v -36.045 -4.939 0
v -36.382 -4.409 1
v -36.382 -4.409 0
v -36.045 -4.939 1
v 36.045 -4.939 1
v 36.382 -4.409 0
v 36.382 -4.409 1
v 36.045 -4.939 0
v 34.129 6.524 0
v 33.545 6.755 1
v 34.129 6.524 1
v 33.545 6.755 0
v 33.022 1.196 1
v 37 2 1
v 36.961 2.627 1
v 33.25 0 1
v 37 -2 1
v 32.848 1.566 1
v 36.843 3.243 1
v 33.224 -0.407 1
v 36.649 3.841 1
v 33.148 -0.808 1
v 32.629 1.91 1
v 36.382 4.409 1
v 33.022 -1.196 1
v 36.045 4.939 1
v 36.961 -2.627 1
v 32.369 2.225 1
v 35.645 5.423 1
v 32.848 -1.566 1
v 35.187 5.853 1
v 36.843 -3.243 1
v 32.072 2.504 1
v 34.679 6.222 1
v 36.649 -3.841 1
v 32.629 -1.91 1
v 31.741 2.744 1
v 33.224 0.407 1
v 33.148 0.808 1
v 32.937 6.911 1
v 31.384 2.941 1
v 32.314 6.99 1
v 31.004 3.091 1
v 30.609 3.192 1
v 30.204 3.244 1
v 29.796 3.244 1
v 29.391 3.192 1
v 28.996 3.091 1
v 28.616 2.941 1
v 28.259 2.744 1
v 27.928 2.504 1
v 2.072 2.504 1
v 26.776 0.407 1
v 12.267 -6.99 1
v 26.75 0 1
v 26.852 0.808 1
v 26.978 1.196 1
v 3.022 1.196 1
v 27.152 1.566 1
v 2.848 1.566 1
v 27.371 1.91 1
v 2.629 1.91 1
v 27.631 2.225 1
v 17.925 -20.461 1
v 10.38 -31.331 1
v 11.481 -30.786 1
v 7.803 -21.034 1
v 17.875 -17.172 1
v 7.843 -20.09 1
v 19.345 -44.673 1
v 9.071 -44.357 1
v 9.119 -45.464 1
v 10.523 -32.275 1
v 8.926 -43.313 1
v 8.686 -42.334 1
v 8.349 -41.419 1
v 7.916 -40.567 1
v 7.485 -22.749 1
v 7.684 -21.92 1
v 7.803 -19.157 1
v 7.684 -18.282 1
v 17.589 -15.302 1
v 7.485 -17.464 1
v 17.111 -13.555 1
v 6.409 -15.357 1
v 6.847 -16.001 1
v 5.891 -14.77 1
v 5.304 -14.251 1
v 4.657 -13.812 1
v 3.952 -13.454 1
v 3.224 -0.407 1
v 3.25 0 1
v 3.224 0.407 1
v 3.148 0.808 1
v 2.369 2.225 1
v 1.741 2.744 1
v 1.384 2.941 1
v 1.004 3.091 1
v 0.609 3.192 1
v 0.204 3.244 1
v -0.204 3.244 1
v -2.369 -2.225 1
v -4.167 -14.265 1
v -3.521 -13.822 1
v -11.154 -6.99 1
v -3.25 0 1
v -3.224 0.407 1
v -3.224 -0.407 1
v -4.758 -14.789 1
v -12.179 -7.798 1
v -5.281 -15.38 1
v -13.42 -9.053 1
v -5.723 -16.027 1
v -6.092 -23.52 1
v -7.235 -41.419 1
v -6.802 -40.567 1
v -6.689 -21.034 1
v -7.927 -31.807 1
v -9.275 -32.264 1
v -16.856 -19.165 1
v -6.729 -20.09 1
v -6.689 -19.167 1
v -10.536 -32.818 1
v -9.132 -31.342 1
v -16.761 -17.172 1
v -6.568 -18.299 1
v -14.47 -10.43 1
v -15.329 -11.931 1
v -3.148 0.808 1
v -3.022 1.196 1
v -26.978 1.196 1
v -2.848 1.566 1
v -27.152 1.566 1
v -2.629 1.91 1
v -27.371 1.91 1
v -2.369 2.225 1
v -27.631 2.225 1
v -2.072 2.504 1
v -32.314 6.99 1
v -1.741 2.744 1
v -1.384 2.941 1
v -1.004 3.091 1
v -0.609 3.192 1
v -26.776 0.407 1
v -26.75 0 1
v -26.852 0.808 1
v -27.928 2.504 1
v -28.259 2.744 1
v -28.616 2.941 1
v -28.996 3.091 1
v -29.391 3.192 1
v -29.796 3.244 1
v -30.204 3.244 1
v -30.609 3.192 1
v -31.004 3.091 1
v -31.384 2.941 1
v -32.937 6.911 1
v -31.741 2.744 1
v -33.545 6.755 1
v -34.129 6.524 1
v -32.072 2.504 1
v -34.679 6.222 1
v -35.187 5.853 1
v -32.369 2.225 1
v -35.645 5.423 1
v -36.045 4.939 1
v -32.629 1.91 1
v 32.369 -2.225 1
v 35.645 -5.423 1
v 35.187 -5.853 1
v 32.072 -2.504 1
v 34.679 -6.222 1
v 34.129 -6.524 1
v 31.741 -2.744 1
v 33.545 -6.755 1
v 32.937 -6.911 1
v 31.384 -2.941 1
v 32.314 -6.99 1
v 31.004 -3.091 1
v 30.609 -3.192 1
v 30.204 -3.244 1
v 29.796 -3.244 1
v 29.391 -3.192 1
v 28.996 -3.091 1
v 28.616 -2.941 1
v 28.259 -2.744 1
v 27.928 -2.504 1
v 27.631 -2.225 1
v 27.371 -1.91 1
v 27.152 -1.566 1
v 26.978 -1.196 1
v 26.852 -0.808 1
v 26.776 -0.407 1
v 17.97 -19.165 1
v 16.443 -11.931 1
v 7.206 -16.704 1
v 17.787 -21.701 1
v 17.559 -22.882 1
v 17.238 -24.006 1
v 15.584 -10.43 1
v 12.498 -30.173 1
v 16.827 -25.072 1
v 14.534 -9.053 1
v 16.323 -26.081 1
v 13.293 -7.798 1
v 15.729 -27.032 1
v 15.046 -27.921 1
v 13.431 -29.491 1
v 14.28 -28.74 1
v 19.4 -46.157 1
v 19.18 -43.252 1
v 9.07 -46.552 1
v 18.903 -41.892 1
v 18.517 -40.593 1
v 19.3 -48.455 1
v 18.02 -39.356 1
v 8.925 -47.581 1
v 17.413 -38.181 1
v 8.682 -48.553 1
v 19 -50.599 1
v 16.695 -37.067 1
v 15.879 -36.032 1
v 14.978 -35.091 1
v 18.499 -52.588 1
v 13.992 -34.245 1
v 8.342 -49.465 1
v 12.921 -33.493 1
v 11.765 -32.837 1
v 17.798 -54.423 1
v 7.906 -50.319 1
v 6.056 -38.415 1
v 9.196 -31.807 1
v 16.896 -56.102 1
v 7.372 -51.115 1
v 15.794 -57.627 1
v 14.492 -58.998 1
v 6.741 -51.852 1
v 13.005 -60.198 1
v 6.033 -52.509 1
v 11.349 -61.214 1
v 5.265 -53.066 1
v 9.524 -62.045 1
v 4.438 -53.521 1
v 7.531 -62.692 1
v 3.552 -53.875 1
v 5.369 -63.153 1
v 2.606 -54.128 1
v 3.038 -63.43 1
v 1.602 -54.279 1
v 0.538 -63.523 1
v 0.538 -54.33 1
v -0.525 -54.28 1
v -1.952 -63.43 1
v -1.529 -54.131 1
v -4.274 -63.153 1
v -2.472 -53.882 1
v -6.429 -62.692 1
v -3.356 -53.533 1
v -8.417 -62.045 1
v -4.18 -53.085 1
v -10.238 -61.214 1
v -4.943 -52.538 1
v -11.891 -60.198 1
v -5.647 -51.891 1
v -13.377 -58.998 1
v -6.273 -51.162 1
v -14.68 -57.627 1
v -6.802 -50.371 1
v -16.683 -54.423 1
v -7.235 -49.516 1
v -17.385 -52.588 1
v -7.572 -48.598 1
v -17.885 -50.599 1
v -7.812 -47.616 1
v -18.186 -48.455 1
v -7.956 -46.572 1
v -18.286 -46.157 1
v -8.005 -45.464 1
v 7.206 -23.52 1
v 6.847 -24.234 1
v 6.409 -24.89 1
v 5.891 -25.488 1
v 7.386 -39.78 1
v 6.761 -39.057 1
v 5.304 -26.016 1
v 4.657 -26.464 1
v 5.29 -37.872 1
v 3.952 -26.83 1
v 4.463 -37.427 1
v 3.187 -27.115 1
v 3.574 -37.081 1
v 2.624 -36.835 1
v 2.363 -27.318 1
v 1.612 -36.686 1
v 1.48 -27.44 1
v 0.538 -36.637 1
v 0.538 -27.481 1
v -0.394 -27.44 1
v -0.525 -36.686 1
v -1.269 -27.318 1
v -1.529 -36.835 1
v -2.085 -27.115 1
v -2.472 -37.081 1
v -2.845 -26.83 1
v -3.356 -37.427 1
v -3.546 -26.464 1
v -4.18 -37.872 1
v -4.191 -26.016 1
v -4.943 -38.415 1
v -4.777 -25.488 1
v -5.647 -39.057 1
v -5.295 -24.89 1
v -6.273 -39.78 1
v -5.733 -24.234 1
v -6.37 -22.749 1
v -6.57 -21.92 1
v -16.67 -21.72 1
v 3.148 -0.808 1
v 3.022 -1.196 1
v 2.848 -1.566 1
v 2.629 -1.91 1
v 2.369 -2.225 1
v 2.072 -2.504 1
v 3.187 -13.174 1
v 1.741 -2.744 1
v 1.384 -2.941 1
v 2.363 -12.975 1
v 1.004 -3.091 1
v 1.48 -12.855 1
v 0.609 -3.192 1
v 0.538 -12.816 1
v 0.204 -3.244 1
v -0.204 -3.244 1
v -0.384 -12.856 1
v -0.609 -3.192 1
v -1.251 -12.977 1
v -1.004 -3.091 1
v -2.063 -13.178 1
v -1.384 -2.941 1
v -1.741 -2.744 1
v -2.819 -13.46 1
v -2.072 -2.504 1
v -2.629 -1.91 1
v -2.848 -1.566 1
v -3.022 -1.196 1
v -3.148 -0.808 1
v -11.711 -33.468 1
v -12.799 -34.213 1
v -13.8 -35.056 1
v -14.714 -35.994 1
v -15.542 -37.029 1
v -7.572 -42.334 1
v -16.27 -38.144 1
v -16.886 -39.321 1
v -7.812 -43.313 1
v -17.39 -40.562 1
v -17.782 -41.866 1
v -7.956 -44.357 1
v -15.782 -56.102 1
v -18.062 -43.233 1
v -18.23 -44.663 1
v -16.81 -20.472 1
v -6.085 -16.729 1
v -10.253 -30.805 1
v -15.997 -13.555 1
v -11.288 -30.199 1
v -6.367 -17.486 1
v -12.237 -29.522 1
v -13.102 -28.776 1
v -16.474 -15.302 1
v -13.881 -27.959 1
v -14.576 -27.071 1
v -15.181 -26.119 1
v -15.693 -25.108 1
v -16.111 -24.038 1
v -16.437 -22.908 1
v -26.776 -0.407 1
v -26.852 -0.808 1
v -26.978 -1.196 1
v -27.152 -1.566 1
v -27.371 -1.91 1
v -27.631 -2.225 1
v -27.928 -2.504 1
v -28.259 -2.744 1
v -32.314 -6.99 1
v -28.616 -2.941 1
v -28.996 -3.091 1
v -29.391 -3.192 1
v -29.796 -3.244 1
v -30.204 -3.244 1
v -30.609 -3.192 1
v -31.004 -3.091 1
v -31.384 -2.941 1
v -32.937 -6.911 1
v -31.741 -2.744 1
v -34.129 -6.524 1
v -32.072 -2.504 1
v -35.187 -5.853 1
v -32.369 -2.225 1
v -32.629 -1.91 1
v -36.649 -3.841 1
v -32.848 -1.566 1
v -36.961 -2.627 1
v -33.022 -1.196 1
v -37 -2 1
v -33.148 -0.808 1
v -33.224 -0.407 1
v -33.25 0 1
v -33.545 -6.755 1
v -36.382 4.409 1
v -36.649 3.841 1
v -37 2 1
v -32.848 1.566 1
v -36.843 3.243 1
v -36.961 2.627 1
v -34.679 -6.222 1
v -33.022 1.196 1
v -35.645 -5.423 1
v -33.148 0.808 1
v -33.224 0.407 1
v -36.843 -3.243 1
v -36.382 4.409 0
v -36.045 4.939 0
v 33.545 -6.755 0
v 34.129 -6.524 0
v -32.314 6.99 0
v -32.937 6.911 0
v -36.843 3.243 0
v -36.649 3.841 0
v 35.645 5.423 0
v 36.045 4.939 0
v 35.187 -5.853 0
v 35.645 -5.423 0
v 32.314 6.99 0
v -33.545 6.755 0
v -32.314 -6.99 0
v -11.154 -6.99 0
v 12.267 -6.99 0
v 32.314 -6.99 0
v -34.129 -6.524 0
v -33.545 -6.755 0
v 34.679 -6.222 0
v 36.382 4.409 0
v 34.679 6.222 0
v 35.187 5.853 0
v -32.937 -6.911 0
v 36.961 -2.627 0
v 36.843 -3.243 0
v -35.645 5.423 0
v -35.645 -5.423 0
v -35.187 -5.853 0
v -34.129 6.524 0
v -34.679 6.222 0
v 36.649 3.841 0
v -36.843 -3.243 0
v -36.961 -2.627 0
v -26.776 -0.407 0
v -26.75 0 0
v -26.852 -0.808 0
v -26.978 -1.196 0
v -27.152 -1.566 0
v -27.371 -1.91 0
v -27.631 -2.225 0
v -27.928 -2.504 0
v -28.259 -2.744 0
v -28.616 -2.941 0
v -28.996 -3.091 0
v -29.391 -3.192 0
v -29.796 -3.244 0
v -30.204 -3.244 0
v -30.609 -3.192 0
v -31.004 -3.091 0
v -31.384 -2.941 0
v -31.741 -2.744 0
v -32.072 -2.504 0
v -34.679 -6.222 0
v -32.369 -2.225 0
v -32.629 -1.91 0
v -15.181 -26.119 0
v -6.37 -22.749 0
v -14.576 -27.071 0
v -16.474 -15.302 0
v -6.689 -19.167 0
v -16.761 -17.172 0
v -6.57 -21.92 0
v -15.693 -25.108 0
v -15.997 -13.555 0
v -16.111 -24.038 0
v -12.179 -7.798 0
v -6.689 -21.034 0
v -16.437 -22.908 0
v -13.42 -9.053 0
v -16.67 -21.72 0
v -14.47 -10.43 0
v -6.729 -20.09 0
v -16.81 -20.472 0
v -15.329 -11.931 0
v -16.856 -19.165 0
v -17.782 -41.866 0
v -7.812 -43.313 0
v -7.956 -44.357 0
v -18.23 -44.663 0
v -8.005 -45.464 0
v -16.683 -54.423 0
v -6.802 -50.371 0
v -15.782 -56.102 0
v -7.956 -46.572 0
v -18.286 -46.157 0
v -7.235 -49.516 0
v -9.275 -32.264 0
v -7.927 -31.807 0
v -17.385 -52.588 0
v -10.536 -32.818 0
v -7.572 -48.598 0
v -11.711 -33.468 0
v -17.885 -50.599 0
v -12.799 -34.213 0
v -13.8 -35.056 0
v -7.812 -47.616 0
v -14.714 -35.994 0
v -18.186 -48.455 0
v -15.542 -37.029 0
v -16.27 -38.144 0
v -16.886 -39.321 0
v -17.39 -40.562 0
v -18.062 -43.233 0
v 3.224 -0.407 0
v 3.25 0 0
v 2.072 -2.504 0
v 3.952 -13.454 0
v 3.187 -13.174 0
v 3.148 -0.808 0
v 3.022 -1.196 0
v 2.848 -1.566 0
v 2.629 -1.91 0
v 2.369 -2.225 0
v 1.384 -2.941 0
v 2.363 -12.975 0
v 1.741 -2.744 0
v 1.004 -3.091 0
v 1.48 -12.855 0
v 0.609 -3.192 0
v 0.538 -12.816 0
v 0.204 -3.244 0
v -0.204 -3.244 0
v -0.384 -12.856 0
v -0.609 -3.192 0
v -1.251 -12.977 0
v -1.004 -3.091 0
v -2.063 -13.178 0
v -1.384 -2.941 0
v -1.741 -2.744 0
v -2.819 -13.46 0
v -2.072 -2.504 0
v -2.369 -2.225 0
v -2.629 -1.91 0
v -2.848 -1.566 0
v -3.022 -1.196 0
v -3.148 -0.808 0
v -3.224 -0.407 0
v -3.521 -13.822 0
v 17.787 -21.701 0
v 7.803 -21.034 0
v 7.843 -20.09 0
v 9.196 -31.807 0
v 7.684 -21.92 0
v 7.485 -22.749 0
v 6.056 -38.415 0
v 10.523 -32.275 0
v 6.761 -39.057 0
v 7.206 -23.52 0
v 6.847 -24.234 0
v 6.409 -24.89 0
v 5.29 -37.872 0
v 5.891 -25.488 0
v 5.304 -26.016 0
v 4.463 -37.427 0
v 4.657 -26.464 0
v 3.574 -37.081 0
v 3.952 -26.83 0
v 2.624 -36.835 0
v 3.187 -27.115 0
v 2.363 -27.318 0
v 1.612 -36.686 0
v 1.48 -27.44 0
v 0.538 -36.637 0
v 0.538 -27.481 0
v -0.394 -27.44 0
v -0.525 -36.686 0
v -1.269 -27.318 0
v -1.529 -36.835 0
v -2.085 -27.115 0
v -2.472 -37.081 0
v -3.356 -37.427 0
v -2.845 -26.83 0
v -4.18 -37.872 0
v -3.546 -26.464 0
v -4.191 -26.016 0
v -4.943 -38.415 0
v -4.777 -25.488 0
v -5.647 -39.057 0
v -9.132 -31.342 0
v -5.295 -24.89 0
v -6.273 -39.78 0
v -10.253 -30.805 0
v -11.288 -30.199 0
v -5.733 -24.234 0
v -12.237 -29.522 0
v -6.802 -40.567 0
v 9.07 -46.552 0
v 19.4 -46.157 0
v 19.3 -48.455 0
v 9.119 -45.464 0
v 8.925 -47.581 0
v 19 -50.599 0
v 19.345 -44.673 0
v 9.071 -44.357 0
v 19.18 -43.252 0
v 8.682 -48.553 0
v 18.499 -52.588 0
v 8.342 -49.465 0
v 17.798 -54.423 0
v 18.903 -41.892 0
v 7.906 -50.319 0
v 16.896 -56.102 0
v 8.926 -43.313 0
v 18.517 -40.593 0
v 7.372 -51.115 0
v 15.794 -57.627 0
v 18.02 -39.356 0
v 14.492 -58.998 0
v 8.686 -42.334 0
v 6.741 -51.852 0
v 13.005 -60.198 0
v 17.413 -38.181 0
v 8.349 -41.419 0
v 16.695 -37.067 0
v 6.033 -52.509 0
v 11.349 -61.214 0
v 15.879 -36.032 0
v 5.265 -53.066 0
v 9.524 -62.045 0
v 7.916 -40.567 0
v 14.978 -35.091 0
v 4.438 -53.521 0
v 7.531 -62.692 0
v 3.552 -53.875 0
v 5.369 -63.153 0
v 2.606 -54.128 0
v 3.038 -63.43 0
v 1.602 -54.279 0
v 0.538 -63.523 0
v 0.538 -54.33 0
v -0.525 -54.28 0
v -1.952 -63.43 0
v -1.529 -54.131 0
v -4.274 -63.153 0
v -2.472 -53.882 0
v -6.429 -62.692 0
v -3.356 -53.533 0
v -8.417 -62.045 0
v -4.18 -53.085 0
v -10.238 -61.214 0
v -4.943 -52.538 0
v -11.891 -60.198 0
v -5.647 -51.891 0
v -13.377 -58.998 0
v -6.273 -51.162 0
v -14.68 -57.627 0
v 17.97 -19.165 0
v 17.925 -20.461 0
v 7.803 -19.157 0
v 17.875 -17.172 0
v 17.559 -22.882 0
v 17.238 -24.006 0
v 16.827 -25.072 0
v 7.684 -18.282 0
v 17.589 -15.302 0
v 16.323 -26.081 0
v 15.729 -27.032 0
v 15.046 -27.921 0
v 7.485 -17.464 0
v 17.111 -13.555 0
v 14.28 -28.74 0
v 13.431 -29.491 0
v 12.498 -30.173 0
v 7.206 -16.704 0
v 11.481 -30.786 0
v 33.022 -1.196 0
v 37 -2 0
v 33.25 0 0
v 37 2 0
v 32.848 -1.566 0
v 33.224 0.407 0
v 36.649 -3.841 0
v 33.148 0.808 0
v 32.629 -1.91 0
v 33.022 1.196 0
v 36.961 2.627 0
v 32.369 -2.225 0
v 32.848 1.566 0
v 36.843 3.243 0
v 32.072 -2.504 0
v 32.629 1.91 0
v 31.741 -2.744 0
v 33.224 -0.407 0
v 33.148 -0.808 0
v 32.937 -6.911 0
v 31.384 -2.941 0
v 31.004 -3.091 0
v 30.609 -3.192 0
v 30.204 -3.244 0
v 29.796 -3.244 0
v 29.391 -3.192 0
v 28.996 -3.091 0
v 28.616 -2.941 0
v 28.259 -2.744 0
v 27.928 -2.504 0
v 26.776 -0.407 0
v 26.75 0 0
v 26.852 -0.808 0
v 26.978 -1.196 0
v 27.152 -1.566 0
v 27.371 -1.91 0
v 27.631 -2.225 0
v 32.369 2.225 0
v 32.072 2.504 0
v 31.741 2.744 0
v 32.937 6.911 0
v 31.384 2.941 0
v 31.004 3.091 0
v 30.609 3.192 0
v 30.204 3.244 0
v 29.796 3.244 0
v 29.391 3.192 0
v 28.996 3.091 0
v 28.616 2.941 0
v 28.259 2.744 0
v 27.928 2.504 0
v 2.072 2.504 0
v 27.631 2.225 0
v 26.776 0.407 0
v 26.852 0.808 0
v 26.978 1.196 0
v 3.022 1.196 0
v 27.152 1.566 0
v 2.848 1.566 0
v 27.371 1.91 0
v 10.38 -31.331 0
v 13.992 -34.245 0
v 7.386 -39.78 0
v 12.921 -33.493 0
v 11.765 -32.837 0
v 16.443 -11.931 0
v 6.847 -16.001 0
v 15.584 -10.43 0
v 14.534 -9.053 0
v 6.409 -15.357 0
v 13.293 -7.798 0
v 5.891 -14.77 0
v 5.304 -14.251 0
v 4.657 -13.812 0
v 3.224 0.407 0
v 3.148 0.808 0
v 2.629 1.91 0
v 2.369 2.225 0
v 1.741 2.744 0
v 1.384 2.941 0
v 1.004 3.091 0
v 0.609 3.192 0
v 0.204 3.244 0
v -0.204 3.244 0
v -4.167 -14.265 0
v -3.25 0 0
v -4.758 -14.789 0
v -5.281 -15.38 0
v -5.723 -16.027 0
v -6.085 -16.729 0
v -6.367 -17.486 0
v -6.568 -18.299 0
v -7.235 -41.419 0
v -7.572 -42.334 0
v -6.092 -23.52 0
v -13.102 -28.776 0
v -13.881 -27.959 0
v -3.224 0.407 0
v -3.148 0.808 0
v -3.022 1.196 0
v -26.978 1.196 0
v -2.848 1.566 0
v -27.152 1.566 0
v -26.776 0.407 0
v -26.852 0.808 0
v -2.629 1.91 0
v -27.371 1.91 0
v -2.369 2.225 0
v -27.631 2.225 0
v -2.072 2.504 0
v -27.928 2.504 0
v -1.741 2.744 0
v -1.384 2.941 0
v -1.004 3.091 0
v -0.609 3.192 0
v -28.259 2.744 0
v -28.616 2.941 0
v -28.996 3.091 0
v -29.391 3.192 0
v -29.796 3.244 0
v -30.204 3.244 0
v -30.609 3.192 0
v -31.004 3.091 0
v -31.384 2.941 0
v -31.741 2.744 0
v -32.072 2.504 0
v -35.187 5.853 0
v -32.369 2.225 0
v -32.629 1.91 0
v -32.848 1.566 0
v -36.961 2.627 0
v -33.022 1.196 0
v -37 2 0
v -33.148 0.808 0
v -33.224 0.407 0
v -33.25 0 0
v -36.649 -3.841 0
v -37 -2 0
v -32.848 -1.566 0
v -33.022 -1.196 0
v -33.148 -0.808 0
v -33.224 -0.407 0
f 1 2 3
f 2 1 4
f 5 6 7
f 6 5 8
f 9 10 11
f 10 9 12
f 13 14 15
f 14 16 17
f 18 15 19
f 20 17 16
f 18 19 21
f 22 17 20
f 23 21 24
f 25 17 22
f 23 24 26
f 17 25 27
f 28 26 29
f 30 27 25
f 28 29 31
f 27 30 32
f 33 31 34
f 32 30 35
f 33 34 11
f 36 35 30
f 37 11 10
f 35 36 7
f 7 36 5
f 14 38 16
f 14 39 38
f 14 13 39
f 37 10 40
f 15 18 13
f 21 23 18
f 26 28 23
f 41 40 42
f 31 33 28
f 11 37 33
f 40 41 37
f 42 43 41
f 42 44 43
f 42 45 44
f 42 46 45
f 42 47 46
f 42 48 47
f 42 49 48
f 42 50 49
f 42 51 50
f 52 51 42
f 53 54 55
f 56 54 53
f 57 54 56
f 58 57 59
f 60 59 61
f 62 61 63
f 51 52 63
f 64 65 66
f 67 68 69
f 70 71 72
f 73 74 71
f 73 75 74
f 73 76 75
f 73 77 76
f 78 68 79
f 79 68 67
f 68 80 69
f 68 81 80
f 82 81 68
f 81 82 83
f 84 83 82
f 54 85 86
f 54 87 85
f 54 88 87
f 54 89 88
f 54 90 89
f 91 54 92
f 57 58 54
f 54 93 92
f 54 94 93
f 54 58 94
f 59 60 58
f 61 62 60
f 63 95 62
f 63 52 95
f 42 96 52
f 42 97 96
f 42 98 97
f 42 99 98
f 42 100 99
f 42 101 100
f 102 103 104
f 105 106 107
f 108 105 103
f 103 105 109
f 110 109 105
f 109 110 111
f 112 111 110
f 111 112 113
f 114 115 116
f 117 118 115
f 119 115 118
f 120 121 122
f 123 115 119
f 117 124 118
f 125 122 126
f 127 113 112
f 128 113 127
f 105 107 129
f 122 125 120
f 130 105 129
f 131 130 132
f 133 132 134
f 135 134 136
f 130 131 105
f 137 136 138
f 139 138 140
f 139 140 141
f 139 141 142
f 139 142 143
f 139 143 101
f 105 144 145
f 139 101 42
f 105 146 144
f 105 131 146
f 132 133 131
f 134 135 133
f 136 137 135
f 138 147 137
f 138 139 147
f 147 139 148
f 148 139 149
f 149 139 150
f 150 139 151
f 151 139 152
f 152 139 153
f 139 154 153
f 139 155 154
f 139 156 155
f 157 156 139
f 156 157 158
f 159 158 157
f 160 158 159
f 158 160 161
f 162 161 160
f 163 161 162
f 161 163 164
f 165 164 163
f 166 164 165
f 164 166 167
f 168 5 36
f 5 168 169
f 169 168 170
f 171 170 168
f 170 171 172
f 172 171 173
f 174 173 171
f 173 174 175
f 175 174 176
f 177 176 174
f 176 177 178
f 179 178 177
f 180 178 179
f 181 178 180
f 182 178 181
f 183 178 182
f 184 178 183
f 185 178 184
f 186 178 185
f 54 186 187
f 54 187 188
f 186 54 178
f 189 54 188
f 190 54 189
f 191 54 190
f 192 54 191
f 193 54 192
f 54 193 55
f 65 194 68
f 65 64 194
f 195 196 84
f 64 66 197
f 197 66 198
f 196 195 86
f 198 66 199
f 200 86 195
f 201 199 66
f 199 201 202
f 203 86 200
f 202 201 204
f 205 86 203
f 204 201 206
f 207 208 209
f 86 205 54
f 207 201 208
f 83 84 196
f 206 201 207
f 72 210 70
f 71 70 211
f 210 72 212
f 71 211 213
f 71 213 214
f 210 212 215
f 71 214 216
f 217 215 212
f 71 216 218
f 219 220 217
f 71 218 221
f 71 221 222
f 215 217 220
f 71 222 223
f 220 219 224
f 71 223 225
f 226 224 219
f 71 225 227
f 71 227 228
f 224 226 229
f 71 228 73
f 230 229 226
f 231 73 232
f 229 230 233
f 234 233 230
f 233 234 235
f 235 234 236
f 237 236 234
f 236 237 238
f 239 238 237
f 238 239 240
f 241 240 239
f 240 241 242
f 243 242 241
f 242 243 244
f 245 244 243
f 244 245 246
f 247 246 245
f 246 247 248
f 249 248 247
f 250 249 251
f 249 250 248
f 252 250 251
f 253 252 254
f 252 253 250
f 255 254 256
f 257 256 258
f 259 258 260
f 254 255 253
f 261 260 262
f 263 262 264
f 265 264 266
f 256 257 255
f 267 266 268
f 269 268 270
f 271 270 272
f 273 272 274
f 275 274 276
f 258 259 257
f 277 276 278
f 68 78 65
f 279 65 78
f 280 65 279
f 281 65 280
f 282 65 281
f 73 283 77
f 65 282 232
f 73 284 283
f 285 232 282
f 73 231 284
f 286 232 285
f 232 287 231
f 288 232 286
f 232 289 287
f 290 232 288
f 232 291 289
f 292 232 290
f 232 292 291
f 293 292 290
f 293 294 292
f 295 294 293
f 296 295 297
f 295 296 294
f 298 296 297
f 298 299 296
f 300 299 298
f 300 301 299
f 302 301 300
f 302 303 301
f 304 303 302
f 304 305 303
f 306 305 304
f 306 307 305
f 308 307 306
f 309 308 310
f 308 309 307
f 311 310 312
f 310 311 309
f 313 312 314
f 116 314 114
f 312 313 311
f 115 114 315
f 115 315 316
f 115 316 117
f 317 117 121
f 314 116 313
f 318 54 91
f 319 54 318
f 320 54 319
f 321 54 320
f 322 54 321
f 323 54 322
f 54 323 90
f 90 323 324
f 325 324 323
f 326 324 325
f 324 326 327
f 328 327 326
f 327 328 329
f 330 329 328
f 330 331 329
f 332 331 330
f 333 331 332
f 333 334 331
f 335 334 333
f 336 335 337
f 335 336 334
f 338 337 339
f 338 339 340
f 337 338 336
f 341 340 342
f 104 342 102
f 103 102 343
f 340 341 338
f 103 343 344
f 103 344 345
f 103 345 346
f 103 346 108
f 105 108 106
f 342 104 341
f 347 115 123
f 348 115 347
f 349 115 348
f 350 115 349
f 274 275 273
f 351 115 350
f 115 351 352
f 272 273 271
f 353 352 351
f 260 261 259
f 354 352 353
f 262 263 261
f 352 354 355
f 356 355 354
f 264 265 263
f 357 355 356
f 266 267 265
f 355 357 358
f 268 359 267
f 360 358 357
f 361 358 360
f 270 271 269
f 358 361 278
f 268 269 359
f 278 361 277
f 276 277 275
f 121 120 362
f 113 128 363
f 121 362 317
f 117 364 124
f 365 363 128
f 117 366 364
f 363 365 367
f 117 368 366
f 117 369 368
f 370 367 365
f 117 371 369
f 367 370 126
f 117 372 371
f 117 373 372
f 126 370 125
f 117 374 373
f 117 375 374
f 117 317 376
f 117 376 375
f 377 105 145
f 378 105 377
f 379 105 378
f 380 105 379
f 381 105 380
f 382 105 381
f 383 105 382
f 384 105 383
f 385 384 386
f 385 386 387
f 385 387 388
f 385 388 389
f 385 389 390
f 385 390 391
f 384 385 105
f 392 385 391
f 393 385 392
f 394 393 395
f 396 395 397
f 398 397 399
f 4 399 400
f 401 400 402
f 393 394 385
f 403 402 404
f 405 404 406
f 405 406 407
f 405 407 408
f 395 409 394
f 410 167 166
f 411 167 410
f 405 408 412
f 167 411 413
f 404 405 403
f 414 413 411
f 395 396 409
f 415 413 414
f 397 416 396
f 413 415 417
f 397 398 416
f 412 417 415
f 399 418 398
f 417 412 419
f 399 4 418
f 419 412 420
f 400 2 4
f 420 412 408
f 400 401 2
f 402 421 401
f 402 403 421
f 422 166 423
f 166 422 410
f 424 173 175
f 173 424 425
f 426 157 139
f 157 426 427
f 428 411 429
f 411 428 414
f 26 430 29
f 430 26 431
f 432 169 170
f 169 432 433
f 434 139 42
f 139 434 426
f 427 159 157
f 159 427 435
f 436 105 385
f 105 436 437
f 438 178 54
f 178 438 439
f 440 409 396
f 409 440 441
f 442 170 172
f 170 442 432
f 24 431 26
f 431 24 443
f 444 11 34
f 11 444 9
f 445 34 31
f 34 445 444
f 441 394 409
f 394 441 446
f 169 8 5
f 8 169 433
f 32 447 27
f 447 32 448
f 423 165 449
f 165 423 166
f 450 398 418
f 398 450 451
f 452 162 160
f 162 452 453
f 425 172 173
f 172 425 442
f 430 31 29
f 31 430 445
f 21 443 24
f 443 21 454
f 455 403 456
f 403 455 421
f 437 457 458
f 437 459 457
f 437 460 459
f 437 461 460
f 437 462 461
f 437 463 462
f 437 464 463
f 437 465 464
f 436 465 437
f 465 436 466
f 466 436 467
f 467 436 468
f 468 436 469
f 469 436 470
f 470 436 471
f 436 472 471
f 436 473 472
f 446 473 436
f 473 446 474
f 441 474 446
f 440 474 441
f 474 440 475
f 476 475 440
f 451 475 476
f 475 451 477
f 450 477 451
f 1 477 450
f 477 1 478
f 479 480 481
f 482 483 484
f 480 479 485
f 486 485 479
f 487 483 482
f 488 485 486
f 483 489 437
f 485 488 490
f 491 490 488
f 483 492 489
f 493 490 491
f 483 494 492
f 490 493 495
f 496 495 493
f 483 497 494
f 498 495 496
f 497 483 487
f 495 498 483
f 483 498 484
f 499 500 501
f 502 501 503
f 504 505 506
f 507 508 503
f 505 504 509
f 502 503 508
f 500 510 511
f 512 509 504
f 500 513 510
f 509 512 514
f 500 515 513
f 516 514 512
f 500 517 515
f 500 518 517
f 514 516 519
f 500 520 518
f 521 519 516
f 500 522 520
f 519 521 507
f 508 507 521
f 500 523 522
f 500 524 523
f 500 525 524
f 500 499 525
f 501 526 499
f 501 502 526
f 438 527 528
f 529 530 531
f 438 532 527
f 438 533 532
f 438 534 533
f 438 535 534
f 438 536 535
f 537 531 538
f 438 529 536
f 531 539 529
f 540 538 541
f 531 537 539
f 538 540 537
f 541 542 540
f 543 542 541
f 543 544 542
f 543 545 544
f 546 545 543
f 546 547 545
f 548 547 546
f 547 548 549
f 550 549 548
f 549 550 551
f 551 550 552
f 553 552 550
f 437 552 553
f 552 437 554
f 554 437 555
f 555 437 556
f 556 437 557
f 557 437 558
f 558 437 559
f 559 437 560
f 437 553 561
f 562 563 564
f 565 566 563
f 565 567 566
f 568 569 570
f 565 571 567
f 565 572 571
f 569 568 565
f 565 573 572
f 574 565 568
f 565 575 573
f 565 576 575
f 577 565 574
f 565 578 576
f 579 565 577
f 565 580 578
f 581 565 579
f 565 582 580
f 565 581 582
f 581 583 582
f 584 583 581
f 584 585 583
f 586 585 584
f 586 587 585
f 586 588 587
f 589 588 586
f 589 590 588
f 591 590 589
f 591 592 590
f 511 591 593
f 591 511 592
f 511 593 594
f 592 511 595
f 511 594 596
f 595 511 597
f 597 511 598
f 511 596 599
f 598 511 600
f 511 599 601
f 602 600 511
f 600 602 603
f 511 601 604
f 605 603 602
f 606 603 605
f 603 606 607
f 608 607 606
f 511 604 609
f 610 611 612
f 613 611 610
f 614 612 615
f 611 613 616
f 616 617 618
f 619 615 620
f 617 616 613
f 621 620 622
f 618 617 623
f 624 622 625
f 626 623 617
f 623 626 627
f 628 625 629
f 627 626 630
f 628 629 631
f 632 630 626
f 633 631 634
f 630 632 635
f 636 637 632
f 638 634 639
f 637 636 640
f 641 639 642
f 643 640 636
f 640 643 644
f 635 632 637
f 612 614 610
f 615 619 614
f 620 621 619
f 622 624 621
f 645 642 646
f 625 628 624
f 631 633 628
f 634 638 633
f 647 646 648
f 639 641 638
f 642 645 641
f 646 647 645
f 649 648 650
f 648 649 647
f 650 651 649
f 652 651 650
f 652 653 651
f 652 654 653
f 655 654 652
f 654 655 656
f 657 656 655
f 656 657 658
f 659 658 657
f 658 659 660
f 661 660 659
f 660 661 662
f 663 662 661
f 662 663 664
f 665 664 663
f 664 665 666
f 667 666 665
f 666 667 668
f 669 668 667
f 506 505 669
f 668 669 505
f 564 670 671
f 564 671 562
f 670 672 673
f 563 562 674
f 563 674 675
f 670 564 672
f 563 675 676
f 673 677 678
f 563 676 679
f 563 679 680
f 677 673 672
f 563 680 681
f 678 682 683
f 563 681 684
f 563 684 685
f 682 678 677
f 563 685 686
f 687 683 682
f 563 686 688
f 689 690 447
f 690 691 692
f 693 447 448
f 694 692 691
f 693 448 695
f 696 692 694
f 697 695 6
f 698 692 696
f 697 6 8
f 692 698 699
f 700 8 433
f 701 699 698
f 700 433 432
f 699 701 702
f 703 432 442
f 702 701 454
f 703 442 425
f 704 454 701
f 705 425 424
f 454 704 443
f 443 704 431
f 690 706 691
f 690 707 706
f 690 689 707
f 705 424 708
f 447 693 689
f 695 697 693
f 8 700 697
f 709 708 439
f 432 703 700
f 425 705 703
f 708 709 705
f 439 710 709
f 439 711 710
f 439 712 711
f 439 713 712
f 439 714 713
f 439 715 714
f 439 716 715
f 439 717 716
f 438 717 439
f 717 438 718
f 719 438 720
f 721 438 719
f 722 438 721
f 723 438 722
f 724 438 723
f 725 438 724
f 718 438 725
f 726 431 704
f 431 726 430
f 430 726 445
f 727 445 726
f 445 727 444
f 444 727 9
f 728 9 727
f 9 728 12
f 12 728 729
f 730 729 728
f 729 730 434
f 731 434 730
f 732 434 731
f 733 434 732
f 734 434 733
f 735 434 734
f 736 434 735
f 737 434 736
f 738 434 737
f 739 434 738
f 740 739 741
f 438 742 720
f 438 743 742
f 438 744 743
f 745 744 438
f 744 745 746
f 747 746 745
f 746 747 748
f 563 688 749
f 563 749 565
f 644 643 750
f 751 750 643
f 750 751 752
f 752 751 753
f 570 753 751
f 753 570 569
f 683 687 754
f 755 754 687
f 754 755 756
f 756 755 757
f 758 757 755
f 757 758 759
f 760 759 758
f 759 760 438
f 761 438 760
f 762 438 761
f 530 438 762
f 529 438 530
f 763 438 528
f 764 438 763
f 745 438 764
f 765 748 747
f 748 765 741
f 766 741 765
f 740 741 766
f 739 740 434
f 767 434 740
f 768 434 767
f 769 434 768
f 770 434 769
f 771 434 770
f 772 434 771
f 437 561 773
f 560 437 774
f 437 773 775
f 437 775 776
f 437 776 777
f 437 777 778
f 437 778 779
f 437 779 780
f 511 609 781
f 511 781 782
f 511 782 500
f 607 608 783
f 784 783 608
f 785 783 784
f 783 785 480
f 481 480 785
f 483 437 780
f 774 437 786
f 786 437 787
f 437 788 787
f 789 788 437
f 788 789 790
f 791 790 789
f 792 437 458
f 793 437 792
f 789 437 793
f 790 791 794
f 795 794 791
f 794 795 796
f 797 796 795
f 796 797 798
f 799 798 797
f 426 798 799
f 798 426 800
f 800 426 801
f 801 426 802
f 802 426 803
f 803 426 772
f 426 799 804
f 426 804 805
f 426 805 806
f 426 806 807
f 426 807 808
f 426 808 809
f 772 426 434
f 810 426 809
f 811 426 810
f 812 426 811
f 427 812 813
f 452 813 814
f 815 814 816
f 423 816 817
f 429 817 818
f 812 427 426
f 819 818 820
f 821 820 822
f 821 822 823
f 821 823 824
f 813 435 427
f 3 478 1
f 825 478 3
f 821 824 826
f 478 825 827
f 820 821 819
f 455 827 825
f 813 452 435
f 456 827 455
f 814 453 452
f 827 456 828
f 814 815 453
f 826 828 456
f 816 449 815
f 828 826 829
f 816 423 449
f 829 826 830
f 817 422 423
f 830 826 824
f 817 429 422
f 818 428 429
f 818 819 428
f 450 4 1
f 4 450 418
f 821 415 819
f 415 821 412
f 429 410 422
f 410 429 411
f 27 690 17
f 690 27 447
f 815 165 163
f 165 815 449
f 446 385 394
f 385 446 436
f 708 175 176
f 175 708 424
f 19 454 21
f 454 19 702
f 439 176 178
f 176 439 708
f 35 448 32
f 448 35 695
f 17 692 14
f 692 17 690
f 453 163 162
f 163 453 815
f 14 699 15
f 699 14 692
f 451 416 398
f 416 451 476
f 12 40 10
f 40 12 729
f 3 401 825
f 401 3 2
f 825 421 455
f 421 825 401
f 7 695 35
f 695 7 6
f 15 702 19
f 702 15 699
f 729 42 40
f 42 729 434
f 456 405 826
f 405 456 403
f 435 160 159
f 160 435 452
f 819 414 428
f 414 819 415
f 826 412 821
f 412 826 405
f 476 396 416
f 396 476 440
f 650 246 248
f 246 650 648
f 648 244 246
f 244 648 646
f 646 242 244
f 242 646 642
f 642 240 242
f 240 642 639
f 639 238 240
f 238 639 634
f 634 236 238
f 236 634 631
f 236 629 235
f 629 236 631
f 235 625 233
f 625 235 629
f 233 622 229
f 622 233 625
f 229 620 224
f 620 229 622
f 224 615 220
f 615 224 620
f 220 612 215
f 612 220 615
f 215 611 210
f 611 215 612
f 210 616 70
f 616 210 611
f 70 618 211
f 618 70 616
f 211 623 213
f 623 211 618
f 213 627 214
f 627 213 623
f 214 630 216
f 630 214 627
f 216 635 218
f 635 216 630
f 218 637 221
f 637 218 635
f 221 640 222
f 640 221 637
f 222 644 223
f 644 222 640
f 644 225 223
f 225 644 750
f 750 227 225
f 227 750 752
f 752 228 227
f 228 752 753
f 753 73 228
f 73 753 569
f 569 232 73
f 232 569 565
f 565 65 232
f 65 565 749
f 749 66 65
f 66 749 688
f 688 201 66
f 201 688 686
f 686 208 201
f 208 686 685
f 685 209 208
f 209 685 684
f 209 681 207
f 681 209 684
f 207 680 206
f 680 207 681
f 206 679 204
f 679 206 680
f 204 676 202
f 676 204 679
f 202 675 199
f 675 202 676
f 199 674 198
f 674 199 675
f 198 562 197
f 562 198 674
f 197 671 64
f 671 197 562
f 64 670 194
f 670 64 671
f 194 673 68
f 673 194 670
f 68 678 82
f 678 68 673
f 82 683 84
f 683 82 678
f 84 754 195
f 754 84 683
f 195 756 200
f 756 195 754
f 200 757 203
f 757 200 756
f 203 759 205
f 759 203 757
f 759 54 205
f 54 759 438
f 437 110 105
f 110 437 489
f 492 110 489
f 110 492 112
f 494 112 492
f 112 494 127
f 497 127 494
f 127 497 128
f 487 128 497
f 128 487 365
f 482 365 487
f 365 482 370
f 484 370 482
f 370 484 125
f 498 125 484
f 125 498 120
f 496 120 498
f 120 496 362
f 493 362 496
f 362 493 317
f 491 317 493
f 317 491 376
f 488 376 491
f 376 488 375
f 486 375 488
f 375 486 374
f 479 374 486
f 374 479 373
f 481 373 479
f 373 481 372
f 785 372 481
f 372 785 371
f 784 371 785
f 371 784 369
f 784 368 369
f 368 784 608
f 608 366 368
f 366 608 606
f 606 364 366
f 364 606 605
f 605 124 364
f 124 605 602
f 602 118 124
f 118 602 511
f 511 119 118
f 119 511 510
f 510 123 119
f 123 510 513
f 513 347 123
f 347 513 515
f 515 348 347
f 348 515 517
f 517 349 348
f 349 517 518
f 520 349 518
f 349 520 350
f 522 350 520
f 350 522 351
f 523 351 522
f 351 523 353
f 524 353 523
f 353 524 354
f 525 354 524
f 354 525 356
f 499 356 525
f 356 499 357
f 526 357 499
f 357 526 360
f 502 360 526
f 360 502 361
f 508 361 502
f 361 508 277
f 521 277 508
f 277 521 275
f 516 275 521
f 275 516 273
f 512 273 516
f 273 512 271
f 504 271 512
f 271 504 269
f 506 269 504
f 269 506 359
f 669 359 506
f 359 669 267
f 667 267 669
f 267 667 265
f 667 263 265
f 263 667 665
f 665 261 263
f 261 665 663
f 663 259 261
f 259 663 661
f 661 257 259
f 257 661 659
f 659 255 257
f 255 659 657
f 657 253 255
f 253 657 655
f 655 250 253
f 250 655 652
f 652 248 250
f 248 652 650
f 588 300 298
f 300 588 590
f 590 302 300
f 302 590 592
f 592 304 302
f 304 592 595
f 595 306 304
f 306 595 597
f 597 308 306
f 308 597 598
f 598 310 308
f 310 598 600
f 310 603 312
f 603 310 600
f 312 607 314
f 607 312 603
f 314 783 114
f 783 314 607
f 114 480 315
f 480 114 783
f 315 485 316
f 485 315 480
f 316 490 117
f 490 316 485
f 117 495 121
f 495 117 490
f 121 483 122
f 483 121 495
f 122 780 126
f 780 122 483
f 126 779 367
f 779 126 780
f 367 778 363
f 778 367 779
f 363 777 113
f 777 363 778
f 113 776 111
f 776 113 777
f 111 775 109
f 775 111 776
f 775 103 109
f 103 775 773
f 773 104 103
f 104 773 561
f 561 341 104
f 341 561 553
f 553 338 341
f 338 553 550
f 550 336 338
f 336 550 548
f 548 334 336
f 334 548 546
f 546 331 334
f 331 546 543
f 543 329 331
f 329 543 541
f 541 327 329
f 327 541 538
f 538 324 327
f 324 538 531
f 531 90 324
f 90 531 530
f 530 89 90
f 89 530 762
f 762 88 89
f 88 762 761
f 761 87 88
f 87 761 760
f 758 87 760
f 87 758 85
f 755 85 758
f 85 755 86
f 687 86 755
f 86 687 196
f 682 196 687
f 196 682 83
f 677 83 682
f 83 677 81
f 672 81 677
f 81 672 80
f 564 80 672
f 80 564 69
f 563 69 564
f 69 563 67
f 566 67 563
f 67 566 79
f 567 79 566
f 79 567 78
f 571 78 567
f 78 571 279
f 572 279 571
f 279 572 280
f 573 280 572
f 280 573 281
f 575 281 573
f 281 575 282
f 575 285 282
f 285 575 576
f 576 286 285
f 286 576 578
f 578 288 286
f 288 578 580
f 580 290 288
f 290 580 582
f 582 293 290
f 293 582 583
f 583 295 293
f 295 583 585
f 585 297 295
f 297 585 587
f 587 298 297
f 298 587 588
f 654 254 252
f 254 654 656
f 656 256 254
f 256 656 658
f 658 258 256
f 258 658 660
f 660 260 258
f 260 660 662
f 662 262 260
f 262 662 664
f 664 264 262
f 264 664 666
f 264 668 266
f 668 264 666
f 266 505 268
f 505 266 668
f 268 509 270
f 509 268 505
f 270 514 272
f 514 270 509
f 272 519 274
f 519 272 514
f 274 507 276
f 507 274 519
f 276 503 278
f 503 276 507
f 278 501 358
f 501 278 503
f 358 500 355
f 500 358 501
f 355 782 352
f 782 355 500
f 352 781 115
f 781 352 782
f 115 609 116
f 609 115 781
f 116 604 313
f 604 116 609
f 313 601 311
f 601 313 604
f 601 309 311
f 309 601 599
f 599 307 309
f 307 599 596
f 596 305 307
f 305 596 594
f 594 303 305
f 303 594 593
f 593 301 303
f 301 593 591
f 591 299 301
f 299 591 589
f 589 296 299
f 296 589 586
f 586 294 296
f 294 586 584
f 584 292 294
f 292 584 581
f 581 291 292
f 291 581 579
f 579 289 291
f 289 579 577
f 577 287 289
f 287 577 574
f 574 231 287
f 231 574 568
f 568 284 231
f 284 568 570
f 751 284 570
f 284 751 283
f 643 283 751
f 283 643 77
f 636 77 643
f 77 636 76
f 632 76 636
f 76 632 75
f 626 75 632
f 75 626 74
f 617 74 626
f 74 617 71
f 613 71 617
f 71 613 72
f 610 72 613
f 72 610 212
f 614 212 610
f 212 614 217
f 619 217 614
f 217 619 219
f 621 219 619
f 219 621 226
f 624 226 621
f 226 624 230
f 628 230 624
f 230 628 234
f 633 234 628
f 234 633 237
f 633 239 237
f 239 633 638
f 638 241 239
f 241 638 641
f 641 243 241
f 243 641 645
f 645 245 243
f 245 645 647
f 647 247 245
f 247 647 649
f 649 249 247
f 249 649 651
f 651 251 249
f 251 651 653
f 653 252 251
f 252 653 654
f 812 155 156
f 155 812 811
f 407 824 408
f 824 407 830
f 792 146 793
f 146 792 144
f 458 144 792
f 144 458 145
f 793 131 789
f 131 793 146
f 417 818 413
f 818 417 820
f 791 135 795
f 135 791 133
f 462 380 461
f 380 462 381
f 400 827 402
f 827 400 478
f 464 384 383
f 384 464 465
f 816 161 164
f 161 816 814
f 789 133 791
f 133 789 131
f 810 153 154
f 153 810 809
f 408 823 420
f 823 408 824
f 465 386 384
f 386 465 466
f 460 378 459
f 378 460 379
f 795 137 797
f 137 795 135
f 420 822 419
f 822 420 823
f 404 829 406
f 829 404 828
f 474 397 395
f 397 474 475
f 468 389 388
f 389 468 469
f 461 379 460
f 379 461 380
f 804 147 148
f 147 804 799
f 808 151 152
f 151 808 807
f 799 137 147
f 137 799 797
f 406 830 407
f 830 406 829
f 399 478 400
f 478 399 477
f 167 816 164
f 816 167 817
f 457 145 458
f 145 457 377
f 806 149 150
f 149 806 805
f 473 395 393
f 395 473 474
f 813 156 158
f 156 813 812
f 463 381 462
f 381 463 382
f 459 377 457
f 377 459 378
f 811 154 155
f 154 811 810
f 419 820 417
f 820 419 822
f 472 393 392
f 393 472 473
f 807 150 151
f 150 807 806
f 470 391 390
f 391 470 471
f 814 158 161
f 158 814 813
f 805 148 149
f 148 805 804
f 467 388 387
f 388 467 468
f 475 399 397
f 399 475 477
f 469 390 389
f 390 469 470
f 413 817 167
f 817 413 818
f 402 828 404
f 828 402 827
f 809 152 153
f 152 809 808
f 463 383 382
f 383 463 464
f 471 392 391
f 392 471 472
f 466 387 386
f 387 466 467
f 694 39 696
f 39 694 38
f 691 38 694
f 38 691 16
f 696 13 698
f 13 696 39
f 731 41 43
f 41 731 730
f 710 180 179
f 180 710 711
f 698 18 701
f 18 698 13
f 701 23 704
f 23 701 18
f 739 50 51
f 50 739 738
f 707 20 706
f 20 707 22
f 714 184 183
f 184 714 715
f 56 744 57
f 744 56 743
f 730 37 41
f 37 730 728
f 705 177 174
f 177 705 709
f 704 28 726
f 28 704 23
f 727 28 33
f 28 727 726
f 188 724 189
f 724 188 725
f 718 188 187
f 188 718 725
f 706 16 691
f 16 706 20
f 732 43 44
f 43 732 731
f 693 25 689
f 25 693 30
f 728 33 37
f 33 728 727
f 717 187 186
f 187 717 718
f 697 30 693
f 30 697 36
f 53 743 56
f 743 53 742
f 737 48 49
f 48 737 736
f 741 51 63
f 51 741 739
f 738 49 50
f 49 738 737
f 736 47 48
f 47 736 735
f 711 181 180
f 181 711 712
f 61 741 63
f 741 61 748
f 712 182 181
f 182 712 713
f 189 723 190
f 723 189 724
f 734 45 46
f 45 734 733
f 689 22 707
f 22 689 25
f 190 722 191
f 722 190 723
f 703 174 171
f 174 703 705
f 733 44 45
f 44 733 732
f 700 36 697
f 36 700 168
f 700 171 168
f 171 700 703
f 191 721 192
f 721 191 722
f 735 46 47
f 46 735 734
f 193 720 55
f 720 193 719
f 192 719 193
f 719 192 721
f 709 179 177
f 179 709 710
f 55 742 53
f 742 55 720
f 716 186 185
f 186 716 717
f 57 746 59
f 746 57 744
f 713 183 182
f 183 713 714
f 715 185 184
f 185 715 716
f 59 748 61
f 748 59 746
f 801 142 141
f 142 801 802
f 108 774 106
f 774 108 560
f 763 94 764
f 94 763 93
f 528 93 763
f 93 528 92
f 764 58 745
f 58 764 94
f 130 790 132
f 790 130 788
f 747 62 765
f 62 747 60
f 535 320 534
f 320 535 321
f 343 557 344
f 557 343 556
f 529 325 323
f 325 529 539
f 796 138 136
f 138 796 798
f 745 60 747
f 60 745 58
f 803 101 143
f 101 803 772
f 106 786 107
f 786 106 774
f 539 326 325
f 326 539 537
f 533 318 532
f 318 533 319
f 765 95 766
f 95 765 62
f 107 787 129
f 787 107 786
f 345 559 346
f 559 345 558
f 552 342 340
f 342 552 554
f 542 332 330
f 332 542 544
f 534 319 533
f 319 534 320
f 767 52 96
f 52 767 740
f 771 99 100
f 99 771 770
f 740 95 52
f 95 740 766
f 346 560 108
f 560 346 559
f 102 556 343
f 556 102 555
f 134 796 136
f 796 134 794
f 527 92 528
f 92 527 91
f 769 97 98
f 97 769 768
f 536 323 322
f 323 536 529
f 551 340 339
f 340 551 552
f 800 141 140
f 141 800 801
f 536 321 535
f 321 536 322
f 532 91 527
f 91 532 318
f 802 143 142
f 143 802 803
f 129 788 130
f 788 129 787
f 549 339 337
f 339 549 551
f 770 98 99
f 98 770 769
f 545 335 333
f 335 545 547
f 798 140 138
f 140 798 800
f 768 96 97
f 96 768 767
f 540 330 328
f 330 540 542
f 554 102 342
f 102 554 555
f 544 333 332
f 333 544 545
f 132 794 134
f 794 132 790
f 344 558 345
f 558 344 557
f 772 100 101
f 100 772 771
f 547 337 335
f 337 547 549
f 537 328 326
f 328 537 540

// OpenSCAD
$fn = 50;


difference() {
	union() {
		translate(v = [0, 0, 0]) {
			rotate(a = [0, 0, 0]) {
				hull() {
					translate(v = [-32.0000000000, 2.0000000000, 0]) {
						rotate(a = [0, 0, 0]) {
							translate(v = [0, 0, 0]) {
								rotate(a = [0, 0, 0]) {
									cylinder(h = 1, r = 5);
								}
							}
						}
					}
					translate(v = [32.0000000000, 2.0000000000, 0]) {
						rotate(a = [0, 0, 0]) {
							translate(v = [0, 0, 0]) {
								rotate(a = [0, 0, 0]) {
									cylinder(h = 1, r = 5);
								}
							}
						}
					}
					translate(v = [-32.0000000000, -2.0000000000, 0]) {
						rotate(a = [0, 0, 0]) {
							translate(v = [0, 0, 0]) {
								rotate(a = [0, 0, 0]) {
									cylinder(h = 1, r = 5);
								}
							}
						}
					}
					translate(v = [32.0000000000, -2.0000000000, 0]) {
						rotate(a = [0, 0, 0]) {
							translate(v = [0, 0, 0]) {
								rotate(a = [0, 0, 0]) {
									cylinder(h = 1, r = 5);
								}
							}
						}
					}
				}
			}
		}
		translate(v = [0, -5, 0]) {
			rotate(a = [0, 0, 0]) {
				linear_extrude(height = 1) {
					text(font = "DejaVu Sans Mono:style=Bold", halign = "center", size = 57.0000000000, text = "8", valign = "top");
				}
			}
		}
	}
	union() {
		translate(v = [-30.0000000000, 0.0000000000, -125.0000000000]) {
			rotate(a = [0, 0, 0]) {
				cylinder(h = 250, r = 3.2500000000);
			}
		}
		translate(v = [30.0000000000, 0.0000000000, -125.0000000000]) {
			rotate(a = [0, 0, 0]) {
				cylinder(h = 250, r = 3.2500000000);
			}
		}
		translate(v = [30.0000000000, 0.0000000000, -125.0000000000]) {
			rotate(a = [0, 0, 0]) {
				cylinder(h = 250, r = 3.2500000000);
			}
		}
		translate(v = [0, 0, -125.0000000000]) {
			rotate(a = [0, 0, 0]) {
				cylinder(h = 250, r = 3.2500000000);
			}
		}
	}
}
